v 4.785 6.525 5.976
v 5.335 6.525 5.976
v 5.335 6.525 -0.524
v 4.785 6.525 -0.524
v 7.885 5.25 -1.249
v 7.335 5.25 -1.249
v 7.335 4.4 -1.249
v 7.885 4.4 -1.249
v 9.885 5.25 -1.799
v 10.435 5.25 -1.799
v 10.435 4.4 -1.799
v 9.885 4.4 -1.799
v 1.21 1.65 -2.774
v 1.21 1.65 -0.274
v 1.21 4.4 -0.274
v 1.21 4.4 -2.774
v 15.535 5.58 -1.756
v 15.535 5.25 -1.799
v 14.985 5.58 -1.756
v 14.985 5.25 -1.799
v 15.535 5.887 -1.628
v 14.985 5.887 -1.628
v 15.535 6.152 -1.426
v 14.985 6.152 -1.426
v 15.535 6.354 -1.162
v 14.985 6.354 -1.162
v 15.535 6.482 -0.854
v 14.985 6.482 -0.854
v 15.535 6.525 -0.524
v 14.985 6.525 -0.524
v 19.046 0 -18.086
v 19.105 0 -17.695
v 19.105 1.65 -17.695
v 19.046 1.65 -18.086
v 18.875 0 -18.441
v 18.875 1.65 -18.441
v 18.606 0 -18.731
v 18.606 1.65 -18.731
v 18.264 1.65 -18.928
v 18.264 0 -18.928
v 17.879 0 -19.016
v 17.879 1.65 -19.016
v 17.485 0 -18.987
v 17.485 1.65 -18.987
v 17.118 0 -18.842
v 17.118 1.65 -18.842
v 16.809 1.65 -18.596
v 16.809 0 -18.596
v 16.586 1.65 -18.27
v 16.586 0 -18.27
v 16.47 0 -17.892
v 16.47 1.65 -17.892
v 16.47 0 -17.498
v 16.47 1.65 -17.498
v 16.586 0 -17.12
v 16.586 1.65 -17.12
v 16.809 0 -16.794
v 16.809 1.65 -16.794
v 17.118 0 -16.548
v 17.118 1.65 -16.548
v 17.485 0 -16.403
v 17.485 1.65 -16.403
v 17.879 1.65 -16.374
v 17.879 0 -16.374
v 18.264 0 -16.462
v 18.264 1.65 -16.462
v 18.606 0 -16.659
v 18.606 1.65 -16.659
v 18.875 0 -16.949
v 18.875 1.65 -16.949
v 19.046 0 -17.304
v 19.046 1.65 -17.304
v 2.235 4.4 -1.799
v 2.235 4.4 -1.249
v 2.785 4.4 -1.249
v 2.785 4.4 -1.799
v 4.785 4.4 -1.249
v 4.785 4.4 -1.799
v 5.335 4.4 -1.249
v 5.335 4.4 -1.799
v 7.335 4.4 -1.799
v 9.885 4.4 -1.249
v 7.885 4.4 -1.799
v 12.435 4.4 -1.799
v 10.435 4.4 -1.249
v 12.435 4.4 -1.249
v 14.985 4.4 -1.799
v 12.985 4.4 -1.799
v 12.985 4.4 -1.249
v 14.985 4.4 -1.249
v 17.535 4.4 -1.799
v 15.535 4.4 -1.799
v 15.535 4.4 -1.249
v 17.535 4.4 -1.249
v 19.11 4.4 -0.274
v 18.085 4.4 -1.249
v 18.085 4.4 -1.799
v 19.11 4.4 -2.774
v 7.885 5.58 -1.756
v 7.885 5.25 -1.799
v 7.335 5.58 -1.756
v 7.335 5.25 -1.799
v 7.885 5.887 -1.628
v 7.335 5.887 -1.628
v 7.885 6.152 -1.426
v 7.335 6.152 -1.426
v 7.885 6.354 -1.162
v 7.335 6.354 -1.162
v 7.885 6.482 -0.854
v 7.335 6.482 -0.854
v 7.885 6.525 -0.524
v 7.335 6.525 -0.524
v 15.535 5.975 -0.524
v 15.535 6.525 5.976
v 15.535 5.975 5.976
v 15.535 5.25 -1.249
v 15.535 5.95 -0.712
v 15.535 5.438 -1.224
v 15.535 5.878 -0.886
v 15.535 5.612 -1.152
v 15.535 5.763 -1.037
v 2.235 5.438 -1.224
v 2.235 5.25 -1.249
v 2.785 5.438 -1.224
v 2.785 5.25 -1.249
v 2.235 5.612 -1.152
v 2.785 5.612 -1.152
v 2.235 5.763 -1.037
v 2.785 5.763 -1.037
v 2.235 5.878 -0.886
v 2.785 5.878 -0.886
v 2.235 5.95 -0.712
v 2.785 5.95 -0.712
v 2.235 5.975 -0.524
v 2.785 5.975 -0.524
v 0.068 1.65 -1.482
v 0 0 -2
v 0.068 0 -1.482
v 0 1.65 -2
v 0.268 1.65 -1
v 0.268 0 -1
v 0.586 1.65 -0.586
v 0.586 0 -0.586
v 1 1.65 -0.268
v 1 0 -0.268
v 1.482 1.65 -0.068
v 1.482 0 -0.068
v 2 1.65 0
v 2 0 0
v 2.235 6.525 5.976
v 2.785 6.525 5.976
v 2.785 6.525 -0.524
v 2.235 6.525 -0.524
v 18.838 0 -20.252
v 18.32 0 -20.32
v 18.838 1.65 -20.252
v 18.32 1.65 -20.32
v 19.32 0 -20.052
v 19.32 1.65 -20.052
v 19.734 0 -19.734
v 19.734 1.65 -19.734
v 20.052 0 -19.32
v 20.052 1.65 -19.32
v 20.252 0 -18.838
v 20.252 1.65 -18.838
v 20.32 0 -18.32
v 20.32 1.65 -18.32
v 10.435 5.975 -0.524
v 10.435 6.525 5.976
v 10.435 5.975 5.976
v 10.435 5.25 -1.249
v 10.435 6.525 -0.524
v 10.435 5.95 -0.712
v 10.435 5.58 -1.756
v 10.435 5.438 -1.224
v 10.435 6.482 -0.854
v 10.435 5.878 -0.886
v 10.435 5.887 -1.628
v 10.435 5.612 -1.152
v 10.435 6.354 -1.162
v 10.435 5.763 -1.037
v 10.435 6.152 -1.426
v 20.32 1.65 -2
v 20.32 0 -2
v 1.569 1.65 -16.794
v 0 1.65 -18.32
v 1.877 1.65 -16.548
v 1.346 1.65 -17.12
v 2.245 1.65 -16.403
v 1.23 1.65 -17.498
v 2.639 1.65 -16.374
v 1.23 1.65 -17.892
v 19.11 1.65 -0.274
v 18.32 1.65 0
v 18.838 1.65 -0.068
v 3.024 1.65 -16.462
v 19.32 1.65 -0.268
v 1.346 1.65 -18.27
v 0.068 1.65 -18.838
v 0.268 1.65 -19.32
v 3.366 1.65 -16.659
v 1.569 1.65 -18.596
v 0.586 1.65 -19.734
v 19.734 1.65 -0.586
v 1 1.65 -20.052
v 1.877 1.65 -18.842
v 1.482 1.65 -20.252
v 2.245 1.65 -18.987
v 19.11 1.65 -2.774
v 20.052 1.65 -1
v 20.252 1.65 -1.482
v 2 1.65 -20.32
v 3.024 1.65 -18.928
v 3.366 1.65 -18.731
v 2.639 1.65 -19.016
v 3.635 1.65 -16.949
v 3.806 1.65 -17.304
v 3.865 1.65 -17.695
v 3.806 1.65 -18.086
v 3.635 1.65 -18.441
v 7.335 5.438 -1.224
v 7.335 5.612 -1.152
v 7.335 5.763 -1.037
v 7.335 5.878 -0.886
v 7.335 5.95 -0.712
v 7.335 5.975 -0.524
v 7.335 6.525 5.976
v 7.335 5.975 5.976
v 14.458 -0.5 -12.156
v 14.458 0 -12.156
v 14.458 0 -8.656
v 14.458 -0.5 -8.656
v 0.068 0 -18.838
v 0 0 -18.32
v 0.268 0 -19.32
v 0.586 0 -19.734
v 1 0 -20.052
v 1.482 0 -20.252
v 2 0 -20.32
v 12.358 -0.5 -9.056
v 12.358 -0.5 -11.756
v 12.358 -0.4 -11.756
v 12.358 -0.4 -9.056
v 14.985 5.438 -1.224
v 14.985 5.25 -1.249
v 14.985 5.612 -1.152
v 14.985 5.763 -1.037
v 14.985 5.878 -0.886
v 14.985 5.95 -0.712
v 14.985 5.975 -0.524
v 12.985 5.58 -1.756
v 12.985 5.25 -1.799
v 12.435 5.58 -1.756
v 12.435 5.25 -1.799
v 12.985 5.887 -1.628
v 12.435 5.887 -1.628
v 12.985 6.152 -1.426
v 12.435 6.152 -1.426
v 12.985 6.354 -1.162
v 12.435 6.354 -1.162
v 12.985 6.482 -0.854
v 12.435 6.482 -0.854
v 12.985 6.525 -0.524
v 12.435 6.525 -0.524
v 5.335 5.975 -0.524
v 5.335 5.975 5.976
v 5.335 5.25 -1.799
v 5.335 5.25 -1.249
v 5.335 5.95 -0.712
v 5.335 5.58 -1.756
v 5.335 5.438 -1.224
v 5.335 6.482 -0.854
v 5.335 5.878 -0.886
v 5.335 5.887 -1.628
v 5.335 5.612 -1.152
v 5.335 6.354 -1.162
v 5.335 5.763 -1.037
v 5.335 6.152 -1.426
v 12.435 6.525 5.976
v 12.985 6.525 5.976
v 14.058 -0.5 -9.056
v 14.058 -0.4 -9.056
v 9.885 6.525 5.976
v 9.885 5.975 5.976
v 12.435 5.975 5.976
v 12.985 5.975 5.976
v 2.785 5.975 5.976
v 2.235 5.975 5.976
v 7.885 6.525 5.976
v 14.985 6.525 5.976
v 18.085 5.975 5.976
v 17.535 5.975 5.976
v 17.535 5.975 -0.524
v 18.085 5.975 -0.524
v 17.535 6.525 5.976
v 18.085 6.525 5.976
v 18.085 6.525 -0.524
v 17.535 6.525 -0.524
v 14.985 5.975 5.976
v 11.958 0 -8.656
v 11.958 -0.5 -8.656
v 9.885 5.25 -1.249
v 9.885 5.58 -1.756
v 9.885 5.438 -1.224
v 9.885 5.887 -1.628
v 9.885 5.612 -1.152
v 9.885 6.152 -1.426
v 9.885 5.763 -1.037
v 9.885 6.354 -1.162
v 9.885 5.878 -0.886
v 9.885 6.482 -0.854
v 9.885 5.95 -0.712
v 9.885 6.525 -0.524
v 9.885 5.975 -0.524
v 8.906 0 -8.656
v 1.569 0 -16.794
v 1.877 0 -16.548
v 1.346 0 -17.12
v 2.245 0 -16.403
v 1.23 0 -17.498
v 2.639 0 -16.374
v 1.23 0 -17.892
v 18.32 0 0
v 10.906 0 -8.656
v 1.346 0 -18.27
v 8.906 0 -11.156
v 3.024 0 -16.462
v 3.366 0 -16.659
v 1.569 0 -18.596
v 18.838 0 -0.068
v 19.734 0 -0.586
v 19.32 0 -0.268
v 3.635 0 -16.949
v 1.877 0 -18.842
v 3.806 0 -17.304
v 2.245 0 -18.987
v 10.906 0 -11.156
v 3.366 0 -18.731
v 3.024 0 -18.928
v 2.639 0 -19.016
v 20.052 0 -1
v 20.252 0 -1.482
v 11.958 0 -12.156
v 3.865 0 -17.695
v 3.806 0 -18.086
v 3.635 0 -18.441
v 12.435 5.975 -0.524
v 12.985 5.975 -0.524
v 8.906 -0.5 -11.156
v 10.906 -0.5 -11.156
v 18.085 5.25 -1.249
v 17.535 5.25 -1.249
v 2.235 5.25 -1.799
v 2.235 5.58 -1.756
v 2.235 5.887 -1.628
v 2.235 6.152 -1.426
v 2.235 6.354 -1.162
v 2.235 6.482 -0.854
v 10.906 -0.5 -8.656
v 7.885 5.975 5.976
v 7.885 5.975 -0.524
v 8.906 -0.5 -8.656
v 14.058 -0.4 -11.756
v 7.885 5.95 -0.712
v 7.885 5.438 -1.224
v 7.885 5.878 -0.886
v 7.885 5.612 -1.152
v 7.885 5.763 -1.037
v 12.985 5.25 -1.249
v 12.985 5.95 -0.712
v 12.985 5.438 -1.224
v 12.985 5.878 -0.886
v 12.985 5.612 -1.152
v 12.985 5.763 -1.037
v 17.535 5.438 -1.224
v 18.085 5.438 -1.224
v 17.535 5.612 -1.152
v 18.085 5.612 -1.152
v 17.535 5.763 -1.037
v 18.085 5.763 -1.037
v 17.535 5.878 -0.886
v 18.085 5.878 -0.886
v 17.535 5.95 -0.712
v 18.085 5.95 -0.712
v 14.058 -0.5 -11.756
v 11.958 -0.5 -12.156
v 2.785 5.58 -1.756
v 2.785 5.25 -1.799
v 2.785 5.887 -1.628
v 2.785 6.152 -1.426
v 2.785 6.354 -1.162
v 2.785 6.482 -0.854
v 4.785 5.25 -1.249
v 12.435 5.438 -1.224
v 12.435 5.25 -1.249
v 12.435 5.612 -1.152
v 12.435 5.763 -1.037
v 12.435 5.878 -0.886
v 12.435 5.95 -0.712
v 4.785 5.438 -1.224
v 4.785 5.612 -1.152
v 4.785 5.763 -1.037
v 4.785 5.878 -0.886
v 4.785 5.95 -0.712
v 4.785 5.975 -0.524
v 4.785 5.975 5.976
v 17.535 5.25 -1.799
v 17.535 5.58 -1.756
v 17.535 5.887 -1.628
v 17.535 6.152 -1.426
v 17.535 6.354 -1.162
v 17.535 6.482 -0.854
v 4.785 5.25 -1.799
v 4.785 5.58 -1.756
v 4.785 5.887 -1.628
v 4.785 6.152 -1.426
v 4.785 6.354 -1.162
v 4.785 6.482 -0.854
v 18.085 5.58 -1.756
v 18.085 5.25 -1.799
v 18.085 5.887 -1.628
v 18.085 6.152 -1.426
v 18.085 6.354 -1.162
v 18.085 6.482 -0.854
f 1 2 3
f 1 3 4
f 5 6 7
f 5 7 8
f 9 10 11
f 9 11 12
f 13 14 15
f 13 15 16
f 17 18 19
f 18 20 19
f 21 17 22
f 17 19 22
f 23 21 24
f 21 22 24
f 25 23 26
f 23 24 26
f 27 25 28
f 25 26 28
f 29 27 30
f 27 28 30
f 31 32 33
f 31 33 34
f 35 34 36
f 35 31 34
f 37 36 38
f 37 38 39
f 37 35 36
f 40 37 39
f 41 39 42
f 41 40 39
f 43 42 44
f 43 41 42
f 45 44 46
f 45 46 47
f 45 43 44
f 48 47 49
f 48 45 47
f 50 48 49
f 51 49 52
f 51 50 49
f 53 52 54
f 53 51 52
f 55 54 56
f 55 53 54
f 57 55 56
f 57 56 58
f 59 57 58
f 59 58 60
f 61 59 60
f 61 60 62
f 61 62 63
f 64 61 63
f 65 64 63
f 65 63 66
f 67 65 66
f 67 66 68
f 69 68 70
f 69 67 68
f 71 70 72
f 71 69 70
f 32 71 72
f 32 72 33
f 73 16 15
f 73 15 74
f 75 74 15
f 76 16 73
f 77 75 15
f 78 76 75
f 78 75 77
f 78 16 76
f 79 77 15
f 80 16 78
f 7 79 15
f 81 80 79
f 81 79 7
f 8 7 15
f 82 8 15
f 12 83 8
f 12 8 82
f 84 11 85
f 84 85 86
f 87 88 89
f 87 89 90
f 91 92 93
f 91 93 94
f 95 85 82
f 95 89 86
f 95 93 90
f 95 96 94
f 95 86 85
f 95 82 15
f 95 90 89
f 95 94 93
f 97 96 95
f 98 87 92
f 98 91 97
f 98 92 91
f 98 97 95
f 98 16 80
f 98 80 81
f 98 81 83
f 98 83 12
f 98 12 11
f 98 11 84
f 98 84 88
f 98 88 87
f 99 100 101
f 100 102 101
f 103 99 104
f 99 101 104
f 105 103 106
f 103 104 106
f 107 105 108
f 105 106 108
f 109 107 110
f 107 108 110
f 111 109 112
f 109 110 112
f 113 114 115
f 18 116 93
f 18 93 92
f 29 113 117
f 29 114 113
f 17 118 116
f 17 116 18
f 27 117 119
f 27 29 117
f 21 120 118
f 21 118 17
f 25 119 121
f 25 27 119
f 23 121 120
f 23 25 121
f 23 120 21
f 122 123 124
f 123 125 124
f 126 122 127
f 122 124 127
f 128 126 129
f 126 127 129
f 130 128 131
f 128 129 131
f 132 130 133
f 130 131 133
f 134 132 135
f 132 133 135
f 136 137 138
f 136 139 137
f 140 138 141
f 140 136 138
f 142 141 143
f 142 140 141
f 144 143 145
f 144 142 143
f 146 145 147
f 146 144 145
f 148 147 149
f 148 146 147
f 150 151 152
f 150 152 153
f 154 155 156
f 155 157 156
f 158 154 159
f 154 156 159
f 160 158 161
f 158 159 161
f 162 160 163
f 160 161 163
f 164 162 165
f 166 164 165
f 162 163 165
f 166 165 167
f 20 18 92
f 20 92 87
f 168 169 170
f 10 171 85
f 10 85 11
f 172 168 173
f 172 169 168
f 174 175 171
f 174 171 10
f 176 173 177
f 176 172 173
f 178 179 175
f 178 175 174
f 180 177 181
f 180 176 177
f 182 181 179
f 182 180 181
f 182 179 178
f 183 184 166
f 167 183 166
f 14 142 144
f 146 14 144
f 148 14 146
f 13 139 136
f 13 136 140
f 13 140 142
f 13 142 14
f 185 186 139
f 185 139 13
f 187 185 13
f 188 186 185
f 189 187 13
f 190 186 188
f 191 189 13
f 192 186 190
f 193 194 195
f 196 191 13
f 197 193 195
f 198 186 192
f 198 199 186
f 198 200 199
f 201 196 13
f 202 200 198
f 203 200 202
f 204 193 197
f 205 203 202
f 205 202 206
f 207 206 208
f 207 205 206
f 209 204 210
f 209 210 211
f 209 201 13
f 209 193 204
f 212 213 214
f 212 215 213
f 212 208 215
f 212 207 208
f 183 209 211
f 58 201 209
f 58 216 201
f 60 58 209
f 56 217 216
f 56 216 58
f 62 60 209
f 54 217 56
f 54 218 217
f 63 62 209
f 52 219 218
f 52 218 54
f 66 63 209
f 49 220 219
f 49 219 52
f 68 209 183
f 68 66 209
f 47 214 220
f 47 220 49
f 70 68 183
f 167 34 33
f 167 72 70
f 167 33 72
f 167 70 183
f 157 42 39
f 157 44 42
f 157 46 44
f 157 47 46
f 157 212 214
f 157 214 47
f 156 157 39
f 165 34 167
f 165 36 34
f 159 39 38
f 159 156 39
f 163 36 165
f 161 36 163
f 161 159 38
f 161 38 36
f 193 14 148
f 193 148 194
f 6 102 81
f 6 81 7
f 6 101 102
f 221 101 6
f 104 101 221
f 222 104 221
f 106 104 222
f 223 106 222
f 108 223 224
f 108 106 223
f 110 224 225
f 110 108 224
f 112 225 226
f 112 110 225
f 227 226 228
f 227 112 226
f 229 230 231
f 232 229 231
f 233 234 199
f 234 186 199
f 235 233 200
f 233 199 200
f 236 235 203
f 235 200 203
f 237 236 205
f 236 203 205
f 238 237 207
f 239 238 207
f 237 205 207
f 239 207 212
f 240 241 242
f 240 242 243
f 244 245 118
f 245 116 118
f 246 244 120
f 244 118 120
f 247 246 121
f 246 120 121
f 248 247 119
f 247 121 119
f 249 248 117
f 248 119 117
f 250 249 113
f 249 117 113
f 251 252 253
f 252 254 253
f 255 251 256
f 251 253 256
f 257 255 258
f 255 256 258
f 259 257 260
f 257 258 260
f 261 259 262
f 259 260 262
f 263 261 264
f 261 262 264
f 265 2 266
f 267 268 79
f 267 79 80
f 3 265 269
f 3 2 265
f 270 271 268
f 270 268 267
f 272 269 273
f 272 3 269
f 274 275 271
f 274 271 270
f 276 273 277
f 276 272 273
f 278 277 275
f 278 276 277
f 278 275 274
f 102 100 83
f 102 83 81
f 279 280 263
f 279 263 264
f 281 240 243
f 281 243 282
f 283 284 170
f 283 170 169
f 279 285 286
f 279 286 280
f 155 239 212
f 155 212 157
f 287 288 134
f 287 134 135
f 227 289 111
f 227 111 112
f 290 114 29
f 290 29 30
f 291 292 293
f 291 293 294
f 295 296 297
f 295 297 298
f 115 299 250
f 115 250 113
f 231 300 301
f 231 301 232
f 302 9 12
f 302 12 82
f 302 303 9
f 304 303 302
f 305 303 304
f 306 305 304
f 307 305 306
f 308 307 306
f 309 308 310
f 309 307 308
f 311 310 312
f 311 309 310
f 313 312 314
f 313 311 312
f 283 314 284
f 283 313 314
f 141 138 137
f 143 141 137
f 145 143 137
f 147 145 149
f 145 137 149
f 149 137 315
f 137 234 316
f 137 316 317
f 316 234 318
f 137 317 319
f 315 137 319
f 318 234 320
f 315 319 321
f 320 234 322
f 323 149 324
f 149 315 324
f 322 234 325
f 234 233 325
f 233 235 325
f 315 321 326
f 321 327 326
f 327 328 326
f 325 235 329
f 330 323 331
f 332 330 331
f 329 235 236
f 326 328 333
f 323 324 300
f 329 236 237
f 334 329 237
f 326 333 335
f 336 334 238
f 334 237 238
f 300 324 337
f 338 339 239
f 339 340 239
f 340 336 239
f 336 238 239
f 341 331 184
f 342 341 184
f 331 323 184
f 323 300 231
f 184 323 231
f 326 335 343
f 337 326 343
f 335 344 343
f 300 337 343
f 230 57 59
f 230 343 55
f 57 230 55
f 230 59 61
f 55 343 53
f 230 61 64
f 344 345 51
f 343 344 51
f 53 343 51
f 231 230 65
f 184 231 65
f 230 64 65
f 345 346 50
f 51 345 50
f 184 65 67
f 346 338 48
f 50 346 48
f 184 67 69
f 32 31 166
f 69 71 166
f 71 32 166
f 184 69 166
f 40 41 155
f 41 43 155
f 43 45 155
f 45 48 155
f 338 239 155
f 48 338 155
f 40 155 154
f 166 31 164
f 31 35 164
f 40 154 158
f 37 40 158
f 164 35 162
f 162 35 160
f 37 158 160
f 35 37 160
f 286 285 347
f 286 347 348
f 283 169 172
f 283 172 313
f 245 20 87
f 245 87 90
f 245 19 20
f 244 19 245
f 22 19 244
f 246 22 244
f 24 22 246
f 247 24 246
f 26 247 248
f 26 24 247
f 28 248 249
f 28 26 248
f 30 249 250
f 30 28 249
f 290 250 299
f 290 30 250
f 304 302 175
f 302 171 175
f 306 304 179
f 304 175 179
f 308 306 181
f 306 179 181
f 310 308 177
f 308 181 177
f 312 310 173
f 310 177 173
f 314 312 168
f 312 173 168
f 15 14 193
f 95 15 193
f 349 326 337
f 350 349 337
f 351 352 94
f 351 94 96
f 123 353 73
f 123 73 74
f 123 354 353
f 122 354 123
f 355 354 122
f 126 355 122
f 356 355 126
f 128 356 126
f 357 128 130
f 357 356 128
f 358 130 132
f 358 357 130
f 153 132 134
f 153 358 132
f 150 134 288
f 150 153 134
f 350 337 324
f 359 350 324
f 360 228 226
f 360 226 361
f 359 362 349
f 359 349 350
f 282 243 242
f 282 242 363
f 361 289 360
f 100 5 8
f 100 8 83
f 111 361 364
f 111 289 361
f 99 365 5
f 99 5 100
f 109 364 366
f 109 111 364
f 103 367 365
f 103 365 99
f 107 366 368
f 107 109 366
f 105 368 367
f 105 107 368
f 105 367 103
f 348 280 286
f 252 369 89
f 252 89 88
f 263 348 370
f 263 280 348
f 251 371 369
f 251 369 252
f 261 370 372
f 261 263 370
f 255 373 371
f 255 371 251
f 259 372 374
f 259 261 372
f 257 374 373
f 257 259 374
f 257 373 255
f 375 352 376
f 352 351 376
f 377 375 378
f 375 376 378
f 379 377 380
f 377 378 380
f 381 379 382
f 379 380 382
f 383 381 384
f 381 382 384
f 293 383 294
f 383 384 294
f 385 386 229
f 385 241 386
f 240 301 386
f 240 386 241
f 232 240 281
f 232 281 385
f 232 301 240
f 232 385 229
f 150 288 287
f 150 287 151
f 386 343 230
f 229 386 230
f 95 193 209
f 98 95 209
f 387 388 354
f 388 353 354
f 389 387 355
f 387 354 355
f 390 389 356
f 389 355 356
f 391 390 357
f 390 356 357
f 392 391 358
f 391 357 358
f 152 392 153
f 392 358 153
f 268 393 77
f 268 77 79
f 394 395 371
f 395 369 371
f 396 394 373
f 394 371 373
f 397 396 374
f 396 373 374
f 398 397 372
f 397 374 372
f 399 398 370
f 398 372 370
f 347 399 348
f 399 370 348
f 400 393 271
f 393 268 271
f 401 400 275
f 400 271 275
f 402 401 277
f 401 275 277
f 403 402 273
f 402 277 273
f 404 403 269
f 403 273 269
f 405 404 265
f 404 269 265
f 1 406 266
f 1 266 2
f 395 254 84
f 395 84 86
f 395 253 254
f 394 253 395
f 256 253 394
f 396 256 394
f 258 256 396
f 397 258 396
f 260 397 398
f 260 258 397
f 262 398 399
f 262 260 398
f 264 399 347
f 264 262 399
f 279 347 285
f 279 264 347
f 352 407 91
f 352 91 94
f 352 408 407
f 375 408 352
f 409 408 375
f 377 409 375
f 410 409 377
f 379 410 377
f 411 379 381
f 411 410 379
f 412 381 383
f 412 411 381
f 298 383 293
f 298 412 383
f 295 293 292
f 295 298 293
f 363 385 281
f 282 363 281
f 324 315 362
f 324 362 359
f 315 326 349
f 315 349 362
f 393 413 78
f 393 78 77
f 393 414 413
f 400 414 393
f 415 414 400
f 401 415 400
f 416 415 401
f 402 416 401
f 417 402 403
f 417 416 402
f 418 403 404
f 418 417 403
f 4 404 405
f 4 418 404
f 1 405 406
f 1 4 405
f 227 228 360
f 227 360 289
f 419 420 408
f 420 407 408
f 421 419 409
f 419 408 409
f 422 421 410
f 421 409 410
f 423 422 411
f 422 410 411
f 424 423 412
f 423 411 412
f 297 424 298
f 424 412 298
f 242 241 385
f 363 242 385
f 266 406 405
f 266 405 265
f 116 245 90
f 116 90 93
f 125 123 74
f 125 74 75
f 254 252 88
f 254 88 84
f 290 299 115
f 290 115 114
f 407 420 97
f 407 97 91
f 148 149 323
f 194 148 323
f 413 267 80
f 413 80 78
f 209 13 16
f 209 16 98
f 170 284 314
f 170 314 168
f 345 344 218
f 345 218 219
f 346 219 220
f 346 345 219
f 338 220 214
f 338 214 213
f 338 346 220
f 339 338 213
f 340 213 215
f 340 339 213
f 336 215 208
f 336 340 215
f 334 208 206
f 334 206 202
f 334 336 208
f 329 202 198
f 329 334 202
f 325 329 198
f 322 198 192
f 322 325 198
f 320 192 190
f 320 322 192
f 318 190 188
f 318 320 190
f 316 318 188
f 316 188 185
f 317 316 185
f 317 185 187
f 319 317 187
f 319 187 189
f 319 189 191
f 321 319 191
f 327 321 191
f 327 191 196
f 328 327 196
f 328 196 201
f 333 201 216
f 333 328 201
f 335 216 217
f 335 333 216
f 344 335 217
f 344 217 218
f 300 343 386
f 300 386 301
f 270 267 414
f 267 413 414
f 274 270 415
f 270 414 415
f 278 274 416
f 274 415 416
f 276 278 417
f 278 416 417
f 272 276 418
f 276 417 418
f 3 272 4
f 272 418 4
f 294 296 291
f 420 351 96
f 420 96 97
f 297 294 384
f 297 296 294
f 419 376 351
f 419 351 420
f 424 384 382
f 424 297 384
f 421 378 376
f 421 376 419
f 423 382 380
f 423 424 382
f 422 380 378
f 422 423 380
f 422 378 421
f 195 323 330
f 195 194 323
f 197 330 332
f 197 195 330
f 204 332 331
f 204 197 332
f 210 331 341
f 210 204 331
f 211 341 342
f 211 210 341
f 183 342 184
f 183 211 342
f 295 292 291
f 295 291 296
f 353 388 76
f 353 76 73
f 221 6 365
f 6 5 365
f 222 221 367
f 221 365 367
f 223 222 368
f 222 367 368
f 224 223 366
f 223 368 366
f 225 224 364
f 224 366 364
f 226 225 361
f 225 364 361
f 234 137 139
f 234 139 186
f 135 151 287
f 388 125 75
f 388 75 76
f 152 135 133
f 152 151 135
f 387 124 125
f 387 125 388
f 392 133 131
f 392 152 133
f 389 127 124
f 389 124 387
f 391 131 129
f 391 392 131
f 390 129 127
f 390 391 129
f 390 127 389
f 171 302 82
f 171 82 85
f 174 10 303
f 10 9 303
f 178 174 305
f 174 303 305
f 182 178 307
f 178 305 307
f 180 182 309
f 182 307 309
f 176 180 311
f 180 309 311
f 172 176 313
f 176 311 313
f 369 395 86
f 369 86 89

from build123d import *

# Parameters (mm, degrees)
SKETCH2_W           = 20.32
SKETCH2_H           = 20.32
SKETCH2_R           = 1.325
BOSS_EXTRUDE1_DEPTH = 1.65
SKETCH3_W           = 0.55
SKETCH3_H           = 0.55
LPATTERN1_COUNT     = 4
LPATTERN1_PITCH     = 2.55
LPATTERN1_COL_COUNT = 4
LPATTERN1_COL_PITCH = 2.55
SKETCH5_W           = 17.9
SKETCH5_H           = 2.5
BOSS_EXTRUDE2_DEPTH = 2.75
SKETCH6_W           = 2
SKETCH6_H           = 2.5
SKETCH6_W_2         = 2.5
SKETCH6_H_2         = 3.5
BOSS_EXTRUDE3_DEPTH = 0.5
FILLET1_R           = 2
SKETCH7_W           = 1.7
SKETCH7_H           = 2.7
CUT_EXTRUDE1_DEPTH  = 0.1


with BuildPart() as part:
    # Sketch2 → Boss-Extrude1 (new body)
    with BuildSketch(Plane(origin=(0, 0, 0), x_dir=(1, 0, 0), z_dir=(0, 1, 0))):
        with Locations((10.16, 10.16)):
            Rectangle(SKETCH2_W, SKETCH2_H)
        with Locations((2.54, 17.695)):
            Circle(SKETCH2_R, mode=Mode.SUBTRACT)
        with Locations((17.78, 17.695)):
            Circle(SKETCH2_R, mode=Mode.SUBTRACT)
    extrude(amount=BOSS_EXTRUDE1_DEPTH)

    # Sweep1: sweep along a path in Sketch4
    with BuildLine(Plane(origin=(0, 0, 0), x_dir=(0, 0, -1), z_dir=(1, 0, 0))) as sweep1_path:
        Line((1.524, 1.65), (1.524, 5.25))
        ThreePointArc((1.524, 5.25), (1.231106781, 5.957106781), (0.524, 6.25))
        Line((0.524, 6.25), (-5.976, 6.25))
    # Sketch3 → Sweep1 (sweep)
    with BuildSketch(Plane(origin=(0, 1.65, 0), x_dir=(1, 0, 0), z_dir=(0, 1, 0))):
        with Locations((10.16, 1.524)):
            Rectangle(SKETCH3_W, SKETCH3_H)
    sweep1 = sweep(path=sweep1_path.line)

    # LPattern1: Sweep1 ×4
    with Locations(*[(-i * LPATTERN1_PITCH, 0, 0) for i in range(1, LPATTERN1_COUNT)]):
        add(sweep1)

    # LPattern1 col: Sweep1 ×4
    with Locations(*[(i * LPATTERN1_COL_PITCH, 0, 0) for i in range(1, LPATTERN1_COL_COUNT)]):
        add(sweep1)

    # Sketch5 → Boss-Extrude2 (add)
    with BuildSketch(Plane(origin=(0, 1.65, 0), x_dir=(1, 0, 0), z_dir=(0, 1, 0))):
        with Locations((10.16, 1.524)):
            Rectangle(SKETCH5_W, SKETCH5_H)
    extrude(amount=BOSS_EXTRUDE2_DEPTH)

    # Sketch6 → Boss-Extrude3 (add)
    with BuildSketch(Plane.XZ):
        with Locations((9.906, -9.906)):
            Rectangle(SKETCH6_W, SKETCH6_H)
        with Locations((13.208, -10.406)):
            Rectangle(SKETCH6_W_2, SKETCH6_H_2)
    extrude(amount=BOSS_EXTRUDE3_DEPTH)

    # Fillet1
    fillet1_edges = [part.edges().sort_by_distance(p)[0] for p in [
        (0, 0.825, -20.32),
        (20.32, 0.825, -20.32),
        (20.32, 0.825, 0),
        (0, 0.825, 0),
    ]]
    fillet(fillet1_edges, radius=FILLET1_R)

    # Sketch7 → Cut-Extrude1 (cut)
    with BuildSketch(Plane.XZ.offset(0.5)):
        with Locations((13.208, -10.406)):
            Rectangle(SKETCH7_W, SKETCH7_H)
    extrude(amount=-CUT_EXTRUDE1_DEPTH, mode=Mode.SUBTRACT)


solid = part.part
